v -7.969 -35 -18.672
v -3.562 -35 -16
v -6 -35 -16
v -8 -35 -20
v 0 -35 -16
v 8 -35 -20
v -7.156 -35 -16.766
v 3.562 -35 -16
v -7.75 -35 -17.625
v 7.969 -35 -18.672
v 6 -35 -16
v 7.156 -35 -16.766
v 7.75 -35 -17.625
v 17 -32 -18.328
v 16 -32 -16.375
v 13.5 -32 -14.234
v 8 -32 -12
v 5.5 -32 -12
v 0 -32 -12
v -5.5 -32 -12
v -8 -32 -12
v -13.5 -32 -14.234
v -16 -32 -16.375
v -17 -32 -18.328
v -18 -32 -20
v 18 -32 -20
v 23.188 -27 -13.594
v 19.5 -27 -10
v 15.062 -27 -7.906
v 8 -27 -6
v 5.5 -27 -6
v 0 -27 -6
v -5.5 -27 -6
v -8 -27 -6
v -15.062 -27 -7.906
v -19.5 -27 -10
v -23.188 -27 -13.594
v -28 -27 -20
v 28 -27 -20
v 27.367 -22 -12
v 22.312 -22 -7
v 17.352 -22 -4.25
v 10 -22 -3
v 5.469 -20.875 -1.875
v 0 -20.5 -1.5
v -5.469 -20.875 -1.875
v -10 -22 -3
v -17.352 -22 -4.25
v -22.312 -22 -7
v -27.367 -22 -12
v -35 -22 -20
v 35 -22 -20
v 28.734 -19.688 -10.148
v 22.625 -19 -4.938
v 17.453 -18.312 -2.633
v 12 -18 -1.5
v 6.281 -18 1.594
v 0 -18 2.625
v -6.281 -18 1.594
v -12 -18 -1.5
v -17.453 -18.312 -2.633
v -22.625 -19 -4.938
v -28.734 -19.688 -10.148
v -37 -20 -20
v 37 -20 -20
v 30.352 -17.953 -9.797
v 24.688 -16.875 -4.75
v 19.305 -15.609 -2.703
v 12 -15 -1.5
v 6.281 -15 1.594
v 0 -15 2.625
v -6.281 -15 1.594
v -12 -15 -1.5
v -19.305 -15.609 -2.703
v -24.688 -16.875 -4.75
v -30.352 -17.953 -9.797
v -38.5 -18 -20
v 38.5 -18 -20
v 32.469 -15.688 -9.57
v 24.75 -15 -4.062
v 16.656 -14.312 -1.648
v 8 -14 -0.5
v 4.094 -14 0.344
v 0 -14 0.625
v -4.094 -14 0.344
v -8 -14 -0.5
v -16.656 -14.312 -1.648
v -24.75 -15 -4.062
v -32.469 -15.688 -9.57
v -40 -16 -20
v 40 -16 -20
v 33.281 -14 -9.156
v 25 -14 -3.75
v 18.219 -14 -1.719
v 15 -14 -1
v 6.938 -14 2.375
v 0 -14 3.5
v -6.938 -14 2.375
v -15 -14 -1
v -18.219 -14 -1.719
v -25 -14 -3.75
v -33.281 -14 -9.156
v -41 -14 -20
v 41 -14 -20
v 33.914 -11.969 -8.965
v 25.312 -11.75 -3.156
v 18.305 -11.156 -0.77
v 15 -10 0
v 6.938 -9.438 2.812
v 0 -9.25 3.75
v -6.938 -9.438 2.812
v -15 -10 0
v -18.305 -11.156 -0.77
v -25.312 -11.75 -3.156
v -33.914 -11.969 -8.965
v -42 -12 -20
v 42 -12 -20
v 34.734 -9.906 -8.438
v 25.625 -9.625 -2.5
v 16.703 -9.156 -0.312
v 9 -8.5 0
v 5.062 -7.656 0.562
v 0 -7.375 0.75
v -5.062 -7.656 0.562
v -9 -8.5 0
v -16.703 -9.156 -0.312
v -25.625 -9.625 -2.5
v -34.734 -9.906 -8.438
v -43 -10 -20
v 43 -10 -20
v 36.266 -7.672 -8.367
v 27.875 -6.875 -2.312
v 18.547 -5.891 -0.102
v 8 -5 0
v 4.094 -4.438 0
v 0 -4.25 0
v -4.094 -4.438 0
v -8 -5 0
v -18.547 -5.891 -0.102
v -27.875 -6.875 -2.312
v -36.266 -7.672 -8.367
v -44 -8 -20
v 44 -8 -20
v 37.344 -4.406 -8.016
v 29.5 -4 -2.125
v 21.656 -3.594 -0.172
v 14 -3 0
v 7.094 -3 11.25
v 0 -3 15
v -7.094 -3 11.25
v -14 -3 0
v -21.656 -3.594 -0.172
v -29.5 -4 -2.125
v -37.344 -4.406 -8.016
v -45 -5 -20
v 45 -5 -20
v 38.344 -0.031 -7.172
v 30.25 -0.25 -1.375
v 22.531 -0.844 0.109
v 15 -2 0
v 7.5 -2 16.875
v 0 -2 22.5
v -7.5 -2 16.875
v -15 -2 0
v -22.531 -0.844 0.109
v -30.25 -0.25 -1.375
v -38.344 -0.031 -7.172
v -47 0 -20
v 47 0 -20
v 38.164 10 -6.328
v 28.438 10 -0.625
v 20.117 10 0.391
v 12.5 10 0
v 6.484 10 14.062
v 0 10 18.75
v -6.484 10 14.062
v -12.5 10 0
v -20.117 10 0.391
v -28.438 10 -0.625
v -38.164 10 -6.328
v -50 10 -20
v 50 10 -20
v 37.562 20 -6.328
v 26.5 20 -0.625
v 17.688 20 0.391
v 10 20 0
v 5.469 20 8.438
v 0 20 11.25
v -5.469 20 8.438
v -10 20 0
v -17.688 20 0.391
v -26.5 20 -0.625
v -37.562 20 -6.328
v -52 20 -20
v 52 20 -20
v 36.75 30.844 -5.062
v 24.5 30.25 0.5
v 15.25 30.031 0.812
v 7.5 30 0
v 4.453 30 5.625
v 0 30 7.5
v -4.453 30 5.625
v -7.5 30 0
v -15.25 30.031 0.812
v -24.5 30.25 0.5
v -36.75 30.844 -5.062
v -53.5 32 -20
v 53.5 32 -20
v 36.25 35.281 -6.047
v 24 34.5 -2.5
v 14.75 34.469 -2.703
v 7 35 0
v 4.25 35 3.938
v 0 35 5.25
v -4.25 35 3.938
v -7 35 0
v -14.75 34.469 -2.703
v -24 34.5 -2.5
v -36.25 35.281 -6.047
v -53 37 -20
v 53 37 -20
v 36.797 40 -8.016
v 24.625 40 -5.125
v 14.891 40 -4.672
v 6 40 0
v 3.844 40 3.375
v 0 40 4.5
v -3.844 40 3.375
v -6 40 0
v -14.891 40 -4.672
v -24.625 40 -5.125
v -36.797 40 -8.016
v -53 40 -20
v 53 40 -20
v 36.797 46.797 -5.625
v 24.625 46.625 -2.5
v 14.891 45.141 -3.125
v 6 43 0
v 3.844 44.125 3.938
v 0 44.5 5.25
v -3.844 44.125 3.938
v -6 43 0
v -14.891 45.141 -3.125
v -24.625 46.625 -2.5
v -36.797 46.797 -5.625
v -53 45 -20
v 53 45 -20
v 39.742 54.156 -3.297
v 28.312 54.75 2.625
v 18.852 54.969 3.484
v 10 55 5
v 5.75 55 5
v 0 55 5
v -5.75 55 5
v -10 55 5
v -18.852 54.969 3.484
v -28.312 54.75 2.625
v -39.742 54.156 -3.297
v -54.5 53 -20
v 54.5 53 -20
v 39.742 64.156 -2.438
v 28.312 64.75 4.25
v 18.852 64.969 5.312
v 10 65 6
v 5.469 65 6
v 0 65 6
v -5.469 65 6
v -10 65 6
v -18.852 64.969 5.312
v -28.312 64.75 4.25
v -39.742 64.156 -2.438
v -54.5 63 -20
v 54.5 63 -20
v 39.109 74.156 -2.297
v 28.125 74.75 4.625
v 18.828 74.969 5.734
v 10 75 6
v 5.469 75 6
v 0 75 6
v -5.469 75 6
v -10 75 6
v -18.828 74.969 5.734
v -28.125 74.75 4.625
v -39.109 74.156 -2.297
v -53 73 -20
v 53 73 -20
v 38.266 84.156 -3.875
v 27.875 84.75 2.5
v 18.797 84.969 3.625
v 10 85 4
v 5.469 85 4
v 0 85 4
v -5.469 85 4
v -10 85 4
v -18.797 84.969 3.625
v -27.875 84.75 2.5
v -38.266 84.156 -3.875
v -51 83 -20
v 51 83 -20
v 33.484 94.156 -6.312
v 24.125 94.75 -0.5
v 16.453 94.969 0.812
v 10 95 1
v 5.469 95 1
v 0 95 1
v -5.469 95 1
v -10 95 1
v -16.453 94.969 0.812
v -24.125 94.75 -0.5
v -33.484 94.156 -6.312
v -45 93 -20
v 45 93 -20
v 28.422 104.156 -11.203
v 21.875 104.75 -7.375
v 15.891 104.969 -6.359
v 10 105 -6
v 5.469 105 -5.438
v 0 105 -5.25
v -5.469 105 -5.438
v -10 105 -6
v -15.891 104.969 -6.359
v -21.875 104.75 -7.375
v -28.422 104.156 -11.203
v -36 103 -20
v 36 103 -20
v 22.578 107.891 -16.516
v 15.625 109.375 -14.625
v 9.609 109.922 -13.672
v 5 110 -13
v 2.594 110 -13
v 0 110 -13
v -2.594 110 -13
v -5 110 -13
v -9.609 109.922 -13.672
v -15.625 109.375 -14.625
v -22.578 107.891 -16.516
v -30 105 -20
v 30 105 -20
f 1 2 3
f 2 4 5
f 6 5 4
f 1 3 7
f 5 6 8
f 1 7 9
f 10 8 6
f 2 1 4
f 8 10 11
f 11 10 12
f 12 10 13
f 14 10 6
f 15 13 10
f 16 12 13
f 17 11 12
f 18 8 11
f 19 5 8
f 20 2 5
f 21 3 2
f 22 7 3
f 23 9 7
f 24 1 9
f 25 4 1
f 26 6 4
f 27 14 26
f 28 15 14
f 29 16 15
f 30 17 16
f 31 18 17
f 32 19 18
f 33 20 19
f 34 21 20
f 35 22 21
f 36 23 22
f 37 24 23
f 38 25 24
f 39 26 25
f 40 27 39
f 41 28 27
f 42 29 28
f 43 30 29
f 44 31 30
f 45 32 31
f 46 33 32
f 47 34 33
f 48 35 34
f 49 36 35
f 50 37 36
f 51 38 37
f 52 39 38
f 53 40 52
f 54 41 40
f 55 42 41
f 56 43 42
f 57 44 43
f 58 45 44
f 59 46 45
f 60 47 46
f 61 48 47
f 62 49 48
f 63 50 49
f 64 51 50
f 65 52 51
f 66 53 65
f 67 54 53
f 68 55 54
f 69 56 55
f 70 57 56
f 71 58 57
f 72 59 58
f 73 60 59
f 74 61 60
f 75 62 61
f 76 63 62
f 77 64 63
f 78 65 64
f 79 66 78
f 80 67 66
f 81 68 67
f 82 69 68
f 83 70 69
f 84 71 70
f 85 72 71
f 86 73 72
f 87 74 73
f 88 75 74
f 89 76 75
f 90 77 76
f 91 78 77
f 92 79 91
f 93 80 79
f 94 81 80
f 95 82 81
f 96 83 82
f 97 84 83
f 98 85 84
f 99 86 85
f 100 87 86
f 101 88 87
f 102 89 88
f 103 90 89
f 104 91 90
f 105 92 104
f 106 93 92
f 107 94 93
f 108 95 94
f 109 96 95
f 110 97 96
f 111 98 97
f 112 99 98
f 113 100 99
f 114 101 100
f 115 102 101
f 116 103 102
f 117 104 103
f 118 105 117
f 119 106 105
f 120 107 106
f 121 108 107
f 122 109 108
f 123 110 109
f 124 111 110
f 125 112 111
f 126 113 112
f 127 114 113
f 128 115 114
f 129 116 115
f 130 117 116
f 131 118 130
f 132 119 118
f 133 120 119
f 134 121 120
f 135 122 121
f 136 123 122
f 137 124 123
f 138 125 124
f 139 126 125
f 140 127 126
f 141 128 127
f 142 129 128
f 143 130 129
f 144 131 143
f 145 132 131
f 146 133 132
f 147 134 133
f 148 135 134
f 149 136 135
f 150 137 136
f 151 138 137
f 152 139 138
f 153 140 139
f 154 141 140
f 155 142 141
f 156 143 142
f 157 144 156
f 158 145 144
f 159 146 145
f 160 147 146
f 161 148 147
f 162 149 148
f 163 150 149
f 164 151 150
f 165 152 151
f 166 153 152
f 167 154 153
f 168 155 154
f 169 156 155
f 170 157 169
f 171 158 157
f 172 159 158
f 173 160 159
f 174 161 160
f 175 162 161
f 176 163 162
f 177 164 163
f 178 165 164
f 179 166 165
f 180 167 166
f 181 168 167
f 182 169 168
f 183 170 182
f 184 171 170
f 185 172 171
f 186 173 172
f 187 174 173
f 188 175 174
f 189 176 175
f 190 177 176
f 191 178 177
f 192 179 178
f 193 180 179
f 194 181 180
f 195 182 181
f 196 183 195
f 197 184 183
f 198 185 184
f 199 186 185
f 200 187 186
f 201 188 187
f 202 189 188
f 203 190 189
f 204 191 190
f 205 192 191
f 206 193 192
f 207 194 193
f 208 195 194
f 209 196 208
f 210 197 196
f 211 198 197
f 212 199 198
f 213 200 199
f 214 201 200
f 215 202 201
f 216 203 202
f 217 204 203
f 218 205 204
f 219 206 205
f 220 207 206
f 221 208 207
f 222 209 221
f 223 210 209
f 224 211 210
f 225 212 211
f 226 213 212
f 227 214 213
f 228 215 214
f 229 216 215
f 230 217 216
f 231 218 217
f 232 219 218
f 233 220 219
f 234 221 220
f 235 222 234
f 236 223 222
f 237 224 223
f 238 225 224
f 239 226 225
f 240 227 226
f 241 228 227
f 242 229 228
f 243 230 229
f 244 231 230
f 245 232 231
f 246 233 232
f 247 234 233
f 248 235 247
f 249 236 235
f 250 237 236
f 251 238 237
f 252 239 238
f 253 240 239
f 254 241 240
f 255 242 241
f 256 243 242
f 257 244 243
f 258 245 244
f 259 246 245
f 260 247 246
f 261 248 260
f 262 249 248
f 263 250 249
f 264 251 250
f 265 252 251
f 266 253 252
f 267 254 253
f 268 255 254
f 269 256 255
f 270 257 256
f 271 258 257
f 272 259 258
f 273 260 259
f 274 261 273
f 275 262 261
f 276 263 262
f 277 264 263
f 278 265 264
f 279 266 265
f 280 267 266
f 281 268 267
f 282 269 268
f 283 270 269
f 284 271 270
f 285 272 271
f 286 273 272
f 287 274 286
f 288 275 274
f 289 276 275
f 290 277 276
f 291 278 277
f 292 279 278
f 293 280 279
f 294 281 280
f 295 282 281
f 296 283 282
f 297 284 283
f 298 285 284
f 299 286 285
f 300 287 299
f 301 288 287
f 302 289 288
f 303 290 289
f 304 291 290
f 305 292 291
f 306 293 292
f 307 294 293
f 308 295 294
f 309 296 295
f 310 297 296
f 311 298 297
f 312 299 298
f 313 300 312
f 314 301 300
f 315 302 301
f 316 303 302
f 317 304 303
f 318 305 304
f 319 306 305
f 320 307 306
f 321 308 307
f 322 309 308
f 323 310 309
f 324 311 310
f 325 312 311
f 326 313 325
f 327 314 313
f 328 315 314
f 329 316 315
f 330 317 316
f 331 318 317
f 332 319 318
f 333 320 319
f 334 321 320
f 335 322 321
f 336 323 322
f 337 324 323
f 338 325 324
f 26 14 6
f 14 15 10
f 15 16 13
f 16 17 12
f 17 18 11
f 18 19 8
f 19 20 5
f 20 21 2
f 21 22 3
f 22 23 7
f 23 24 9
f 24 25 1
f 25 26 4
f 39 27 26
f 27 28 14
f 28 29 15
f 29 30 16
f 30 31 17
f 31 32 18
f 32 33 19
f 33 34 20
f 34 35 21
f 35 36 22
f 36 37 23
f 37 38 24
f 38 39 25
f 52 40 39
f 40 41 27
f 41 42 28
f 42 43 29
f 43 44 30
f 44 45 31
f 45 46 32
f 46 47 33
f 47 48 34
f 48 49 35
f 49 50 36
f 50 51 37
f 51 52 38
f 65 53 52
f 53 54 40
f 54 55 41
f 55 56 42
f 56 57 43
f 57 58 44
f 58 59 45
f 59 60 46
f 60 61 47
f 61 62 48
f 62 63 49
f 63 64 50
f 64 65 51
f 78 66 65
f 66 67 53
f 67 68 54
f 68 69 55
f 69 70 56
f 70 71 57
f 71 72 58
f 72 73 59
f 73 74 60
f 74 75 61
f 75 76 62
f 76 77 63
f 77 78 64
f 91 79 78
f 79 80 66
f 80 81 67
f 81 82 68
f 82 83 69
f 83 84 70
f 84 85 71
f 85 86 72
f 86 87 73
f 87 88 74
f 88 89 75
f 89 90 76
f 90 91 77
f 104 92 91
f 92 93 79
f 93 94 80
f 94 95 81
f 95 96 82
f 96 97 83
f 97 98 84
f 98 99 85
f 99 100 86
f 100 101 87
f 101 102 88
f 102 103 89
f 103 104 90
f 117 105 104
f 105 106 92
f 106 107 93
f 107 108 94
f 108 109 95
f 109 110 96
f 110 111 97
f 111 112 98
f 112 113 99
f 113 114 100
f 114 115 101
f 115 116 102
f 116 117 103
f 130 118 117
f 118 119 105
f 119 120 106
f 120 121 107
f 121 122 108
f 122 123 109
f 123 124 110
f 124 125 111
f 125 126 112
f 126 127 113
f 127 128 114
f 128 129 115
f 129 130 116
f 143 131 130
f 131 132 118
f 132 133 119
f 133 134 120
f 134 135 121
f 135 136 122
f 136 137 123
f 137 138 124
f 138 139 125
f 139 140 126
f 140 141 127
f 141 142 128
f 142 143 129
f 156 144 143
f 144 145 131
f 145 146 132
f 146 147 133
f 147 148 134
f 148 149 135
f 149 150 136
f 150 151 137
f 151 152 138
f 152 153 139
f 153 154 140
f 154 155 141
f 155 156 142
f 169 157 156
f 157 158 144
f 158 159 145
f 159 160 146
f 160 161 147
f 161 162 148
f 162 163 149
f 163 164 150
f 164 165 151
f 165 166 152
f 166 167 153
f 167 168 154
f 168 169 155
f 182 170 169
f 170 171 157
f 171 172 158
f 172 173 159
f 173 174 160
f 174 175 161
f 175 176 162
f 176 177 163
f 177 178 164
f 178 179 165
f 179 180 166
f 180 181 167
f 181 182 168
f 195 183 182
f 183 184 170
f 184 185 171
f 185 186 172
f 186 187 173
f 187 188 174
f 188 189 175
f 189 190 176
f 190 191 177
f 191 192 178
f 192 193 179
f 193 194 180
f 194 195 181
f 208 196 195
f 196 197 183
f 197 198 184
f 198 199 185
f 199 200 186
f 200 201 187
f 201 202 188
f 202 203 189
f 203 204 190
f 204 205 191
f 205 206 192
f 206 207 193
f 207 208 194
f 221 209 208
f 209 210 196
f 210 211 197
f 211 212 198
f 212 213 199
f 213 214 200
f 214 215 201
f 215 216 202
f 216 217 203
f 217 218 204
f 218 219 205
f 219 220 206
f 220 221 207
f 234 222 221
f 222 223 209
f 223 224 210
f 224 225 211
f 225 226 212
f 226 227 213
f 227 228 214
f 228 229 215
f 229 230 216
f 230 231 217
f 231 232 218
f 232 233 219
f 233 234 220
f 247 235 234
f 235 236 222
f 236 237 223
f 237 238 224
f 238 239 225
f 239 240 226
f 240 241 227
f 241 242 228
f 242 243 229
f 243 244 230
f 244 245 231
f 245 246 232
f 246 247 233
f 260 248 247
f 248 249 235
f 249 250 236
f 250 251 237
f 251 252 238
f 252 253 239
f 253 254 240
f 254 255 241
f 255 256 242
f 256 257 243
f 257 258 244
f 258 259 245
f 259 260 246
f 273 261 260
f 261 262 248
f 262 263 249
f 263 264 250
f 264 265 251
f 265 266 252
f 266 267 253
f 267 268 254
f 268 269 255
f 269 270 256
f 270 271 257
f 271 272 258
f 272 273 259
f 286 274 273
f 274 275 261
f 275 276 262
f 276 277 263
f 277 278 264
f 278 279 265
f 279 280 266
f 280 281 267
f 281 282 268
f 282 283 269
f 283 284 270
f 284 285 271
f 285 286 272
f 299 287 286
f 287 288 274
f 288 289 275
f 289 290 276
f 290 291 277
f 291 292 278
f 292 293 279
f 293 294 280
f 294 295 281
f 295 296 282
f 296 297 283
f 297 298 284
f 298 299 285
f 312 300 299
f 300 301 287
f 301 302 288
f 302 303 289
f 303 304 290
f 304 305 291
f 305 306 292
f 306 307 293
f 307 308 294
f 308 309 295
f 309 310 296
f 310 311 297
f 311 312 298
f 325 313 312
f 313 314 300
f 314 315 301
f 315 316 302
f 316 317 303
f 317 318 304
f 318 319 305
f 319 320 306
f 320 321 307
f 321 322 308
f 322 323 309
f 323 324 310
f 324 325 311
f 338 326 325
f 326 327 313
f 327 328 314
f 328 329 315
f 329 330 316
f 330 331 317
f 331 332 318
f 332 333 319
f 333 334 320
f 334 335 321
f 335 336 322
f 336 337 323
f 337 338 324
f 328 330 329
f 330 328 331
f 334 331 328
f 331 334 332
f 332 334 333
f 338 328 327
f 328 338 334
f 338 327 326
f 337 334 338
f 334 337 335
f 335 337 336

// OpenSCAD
model = "SOLID"; // [SOLID, SOLID_CROSS, MASK, MESH]
// Bigger is better
resolution = 0.25;
thickness = 3;

// Commonly-used private APIs

function __to2d(p) = [p[0], p[1]];
function __to3d(p) = [p[0], p[1], 0];

function __reverse(vt) = 
    let(leng = len(vt))
    [
        for(i = [0:leng - 1])
            vt[leng - 1 - i]
    ];
    
function __frags(radius) = $fn > 0 ? 
            ($fn >= 3 ? $fn : 3) : 
            max(min(360 / $fa, radius * 6.28318 / $fs), 5);
            
function __nearest_multiple_of_4(n) =
    let(
        remain = n % 4
    )
    (remain / 4) > 0.5 ? n - remain + 4 : n - remain;


/**
* bezier_curve.scad
*
* Given a set of control points, the bezier_curve function returns points of the Bézier path. 
* Combined with the polyline, polyline3d or hull_polyline3d module defined in my lib-openscad, 
* you can create a Bézier curve.
* 
* @copyright Justin Lin, 2017
* @license https://opensource.org/licenses/lgpl-3.0.html
*
* @see https://openhome.cc/eGossip/OpenSCAD/lib-bezier_curve.html
*
**/ 

function _combi(n, k) =
    let(  
        bi_coef = [      
               [1],     // n = 0: for padding
              [1,1],    // n = 1: for Linear curves, how about drawing a line directly?
             [1,2,1],   // n = 2: for Quadratic curves
            [1,3,3,1]   // n = 3: for Cubic Bézier curves
        ]  
    )
    n < len(bi_coef) ? bi_coef[n][k] : (
        k == 0 ? 1 : (_combi(n, k - 1) * (n - k + 1) / k)
    );
        
function bezier_curve_coordinate(t, pn, n, i = 0) = 
    i == n + 1 ? 0 : 
        (_combi(n, i) * pn[i] * pow(1 - t, n - i) * pow(t, i) + 
            bezier_curve_coordinate(t, pn, n, i + 1));
        
function _bezier_curve_point(t, points) = 
    let(n = len(points) - 1) 
    [
        bezier_curve_coordinate(
            t, 
            [for(p = points) p[0]], 
            n
        ),
        bezier_curve_coordinate(
            t,  
            [for(p = points) p[1]], 
            n
        ),
        bezier_curve_coordinate(
            t, 
            [for(p = points) p[2]], 
            n
        )
    ];

function bezier_curve(t_step, points) = 
    let(
        pts = concat([
            for(t = [0: t_step: 1]) 
                _bezier_curve_point(t, points)
        ], [_bezier_curve_point(1, points)])
    ) 
    len(points[0]) == 3 ? pts : [for(pt = pts) __to2d(pt)];

/**
* rotate_p.scad
*
* Rotates a point 'a' degrees around an arbitrary axis. 
* The rotation is applied in the following order: x, y, z. 
* 
* @copyright Justin Lin, 2017
* @license https://opensource.org/licenses/lgpl-3.0.html
*
* @see https://openhome.cc/eGossip/OpenSCAD/lib-rotate_p.html
*
**/ 

function _rotx(pt, a) = 
    let(cosa = cos(a), sina = sin(a))
    [
        pt[0], 
        pt[1] * cosa - pt[2] * sina,
        pt[1] * sina + pt[2] * cosa
    ];

function _roty(pt, a) = 
    let(cosa = cos(a), sina = sin(a))
    [
        pt[0] * cosa + pt[2] * sina, 
        pt[1],
        -pt[0] * sina + pt[2] * cosa, 
    ];

function _rotz(pt, a) = 
    let(cosa = cos(a), sina = sin(a))
    [
        pt[0] * cosa - pt[1] * sina,
        pt[0] * sina + pt[1] * cosa,
        pt[2]
    ];

function _rotate_p_3d(point, a) =
    _rotz(_roty(_rotx(point, a[0]), a[1]), a[2]);

function to_avect(a) =
     len(a) == 3 ? a : (
         len(a) == 2 ? [a[0], a[1], 0] : (
             len(a) == 1 ? [a[0], 0, 0] : [0, 0, a]
         ) 
     );

function rotate_p(point, a) =
    let(angle = to_avect(a))
    len(point) == 3 ? 
        _rotate_p_3d(point, angle) :
        __to2d(
            _rotate_p_3d(__to3d(point), angle)
        );
    
/**
* polysections.scad
*
* Crosscutting a tube-like shape at different points gets several cross-sections.
* This module can operate reversely. It uses cross-sections to construct a tube-like shape.
* 
* @copyright Justin Lin, 2017
* @license https://opensource.org/licenses/lgpl-3.0.html
*
* @see https://openhome.cc/eGossip/OpenSCAD/lib-polysections.html
*
**/

module polysections(sections, triangles = "SOLID") {

    function side_indexes(sects, begin_idx = 0) = 
        let(       
            leng_sects = len(sects),
            leng_pts_sect = len(sects[0])
        ) 
        concat(
            [
                for(j = [begin_idx:leng_pts_sect:begin_idx + (leng_sects - 2) * leng_pts_sect])
                    for(i = [0:leng_pts_sect - 1]) 
                        [
                            j + i, 
                            j + (i + 1) % leng_pts_sect, 
                            j + (i + 1) % leng_pts_sect + leng_pts_sect
                        ]
            ],
            [
                for(j = [begin_idx:leng_pts_sect:begin_idx + (leng_sects - 2) * leng_pts_sect])
                    for(i = [0:leng_pts_sect - 1]) 
                        [
                            j + i, 
                            j + (i + 1) % leng_pts_sect + leng_pts_sect , 
                            j + i + leng_pts_sect
                        ]
            ]      
        );

    function search_at(f_sect, p, leng_pts_sect, i = 0) =
        i < leng_pts_sect ?
            (p == f_sect[i] ? i : search_at(f_sect, p, leng_pts_sect, i + 1)) : -1;
    
    function the_same_after_twisting(f_sect, l_sect, leng_pts_sect) =
        let(
            found_at_i = search_at(f_sect, l_sect[0], leng_pts_sect)
        )
        found_at_i <= 0 ? false : 
            l_sect == concat(
                [for(i = [found_at_i:leng_pts_sect-1]) f_sect[i]],
                [for(i = [0:found_at_i - 1]) f_sect[i]]
            );        

    module solid_sections(sects) {
        
        leng_sects = len(sects);
        leng_pts_sect = len(sects[0]);
        first_sect = sects[0];
        last_sect = sects[leng_sects - 1];
   
        v_pts = [
            for(sect = sects) 
                for(pt = sect) 
                    pt
        ];

        function begin_end_the_same() =
            first_sect == last_sect || 
            the_same_after_twisting(first_sect, last_sect, leng_pts_sect);

        if(begin_end_the_same()) {
            polyhedron(
                v_pts, 
                side_indexes(sects)
            ); 
        } else {
            first_idxes = [for(i = [0:leng_pts_sect - 1]) leng_pts_sect - 1 - i];  
            last_idxes = [
                for(i = [0:leng_pts_sect - 1]) 
                    i + leng_pts_sect * (leng_sects - 1)
            ];       

            polyhedron(
                v_pts, 
                concat([first_idxes], side_indexes(sects), [last_idxes])
            );    
        }
    }

    module hollow_sections(sects) {
        leng_sects = len(sects);
        leng_sect = len(sects[0]);
        half_leng_sect = leng_sect / 2;
        half_leng_v_pts = leng_sects * half_leng_sect;

        function strip_sects(begin_idx, end_idx) = 
            [
                for(i = [0:leng_sects - 1]) 
                    [
                        for(j = [begin_idx:end_idx])
                            sects[i][j]
                    ]
            ]; 

        function first_idxes() = 
            [
                for(i =  [0:half_leng_sect - 1]) 
                    [
                       i,
                       i + half_leng_v_pts,
                       (i + 1) % half_leng_sect + half_leng_v_pts, 
                       (i + 1) % half_leng_sect
                    ] 
            ];

        function last_idxes(begin_idx) = 
            [
                for(i =  [0:half_leng_sect - 1]) 
                    [
                       begin_idx + i,
                       begin_idx + (i + 1) % half_leng_sect,
                       begin_idx + (i + 1) % half_leng_sect + half_leng_v_pts,
                       begin_idx + i + half_leng_v_pts
                    ]     
            ];            

        outer_sects = strip_sects(0, half_leng_sect - 1);
        inner_sects = strip_sects(half_leng_sect, leng_sect - 1);

        function to_v_pts(sects) = 
             [
                for(sect = sects) 
                    for(pt = sect) 
                        pt
             ];

        outer_v_pts =  to_v_pts(outer_sects);
        inner_v_pts = to_v_pts(inner_sects);

        outer_idxes = side_indexes(outer_sects);
        inner_idxes = [ 
            for(idxes = side_indexes(inner_sects, half_leng_v_pts))
                __reverse(idxes)
        ];

        first_outer_sect = outer_sects[0];
        last_outer_sect = outer_sects[leng_sects - 1];
        first_inner_sect = inner_sects[0];
        last_inner_sect = inner_sects[leng_sects - 1];
        
        leng_pts_sect = len(first_outer_sect);

        function begin_end_the_same() = 
           (first_outer_sect == last_outer_sect && first_inner_sect == last_inner_sect) ||
           (
               the_same_after_twisting(first_outer_sect, last_outer_sect, leng_pts_sect) && 
               the_same_after_twisting(first_inner_sect, last_inner_sect, leng_pts_sect)
           ); 

        if(begin_end_the_same()) {
            polyhedron(
                concat(outer_v_pts, inner_v_pts),
                concat(outer_idxes, inner_idxes)
            );             
        } else {
            first_idxes = first_idxes();
            last_idxes = last_idxes(half_leng_v_pts - half_leng_sect);
            
            polyhedron(
                concat(outer_v_pts, inner_v_pts),
                concat(first_idxes, outer_idxes, inner_idxes, last_idxes)
            ); 
        }
    }
    
    module triangles_defined_sections() {
        module tri_sections(tri1, tri2) {
            polyhedron(
                points = concat(tri1, tri2),
                faces = [
                    [0, 1, 2], 
                    [3, 5, 4], 
                    [0, 4, 1], [1, 5, 2], [2, 3, 0], 
                    [0, 3, 4], [1, 4, 5], [2, 5, 3]
                ]
            );  
        }

        module two_sections(section1, section2) {
            for(idx = triangles) {
                // hull is for preventing from WARNING: Object may not be a valid 2-manifold
                hull() tri_sections(
                    [
                        section1[idx[0]], 
                        section1[idx[1]], 
                        section1[idx[2]]
                    ], 
                    [
                        section2[idx[0]], 
                        section2[idx[1]], 
                        section2[idx[2]]
                    ]
                );
            }
        }
        
        for(i = [0:len(sections) - 2]) {
             two_sections(
                 sections[i], 
                 sections[i + 1]
             );
        }
    }
    
    if(triangles == "SOLID") {
        solid_sections(sections);
    } else if(triangles == "HOLLOW") {
        hollow_sections(sections);
    }
    else {
        triangles_defined_sections();
    }
}

/**
* line3d.scad
*
* Creates a 3D line from two points. 
* 
* @copyright Justin Lin, 2017
* @license https://opensource.org/licenses/lgpl-3.0.html
*
* @see https://openhome.cc/eGossip/OpenSCAD/lib-line3d.html
*
**/


module line3d(p1, p2, thickness, p1Style = "CAP_CIRCLE", p2Style = "CAP_CIRCLE") {
    r = thickness / 2;

    frags = __nearest_multiple_of_4(__frags(r));
    half_fa = 180 / frags;
    
    dx = p2[0] - p1[0];
    dy = p2[1] - p1[1];
    dz = p2[2] - p1[2];
    
    
    length = sqrt(pow(dx, 2) + pow(dy, 2) + pow(dz, 2));

    ay = 90 - atan2(dz, sqrt(pow(dx, 2) + pow(dy, 2)));
    az = atan2(dy, dx);

    module cap_butt() {
        translate(p1) 
            rotate([0, ay, az]) 
                linear_extrude(length) 
                    circle(r, $fn = frags);
    }
                
    module capCircle(p) {
        w = r / 1.414;
        translate(p) 
            rotate([0, ay, az]) 
                translate([0, 0, -w]) 
                    linear_extrude(w * 2) 
                        circle(r, $fn = frags);       
    }

    module capSphere(p) {
        translate(p) 
            rotate([0, ay, az]) 
                sphere(r / cos(half_fa), $fn = frags);          
    }
    
    module cap(p, style) {
        if(style == "CAP_CIRCLE") {
            capCircle(p);     
        } else if(style == "CAP_SPHERE") { 
            capSphere(p);  
        }       
    }
    
    cap_butt();
    cap(p1, p1Style);
    cap(p2, p2Style);
}

/**
* polyline3d.scad
*
* Creates a 3D polyline from a list of `[x, y, z]` coordinates. 
* It depends on the line3d module so you have to include line3d.scad.
* 
* @copyright Justin Lin, 2017
* @license https://opensource.org/licenses/lgpl-3.0.html
*
* @see https://openhome.cc/eGossip/OpenSCAD/lib-polyline3d.html
*
**/

module polyline3d(points, thickness, startingStyle = "CAP_CIRCLE", endingStyle = "CAP_CIRCLE") {
    leng_pts = len(points);
    
    module line_segment(index) {
        styles = index == 1 ? [startingStyle, "CAP_BUTT"] : (
            index == leng_pts - 1 ? ["CAP_SPHERE", endingStyle] : [
                "CAP_SPHERE", "CAP_BUTT"
            ]
        );
        
        line3d(points[index - 1], points[index], thickness, 
               p1Style = styles[0], p2Style = styles[1]);
    }

    module polyline3d_inner(index) {
        if(index < leng_pts) {
            line_segment(index);
            polyline3d_inner(index + 1);
        }
    }

    polyline3d_inner(1);
}

/**
* function_grapher.scad
*
* 
* Given a set of points `[x, y, f(x, y)]` where `f(x, y)` is a 
* mathematics function, the `function_grapher` module can 
* create the graph of `f(x, y)`.
* It depends on the line3d and polyline3d modules so you have 
* to include "line3d.scad" and "polyline3d.scad".
* 
* @copyright Justin Lin, 2017
* @license https://opensource.org/licenses/lgpl-3.0.html
*
* @see https://openhome.cc/eGossip/OpenSCAD/lib-function_grapher.html
*
**/ 

module function_grapher(points, thickness, style = "FACES", slicing = "SLASH") {

    rows = len(points);
    columns = len(points[0]);

    // Increasing $fn will be slow when you use "LINES" or "HULL_FACES".
    
    module faces() {
        function xy_to_index(x, y, columns) = y * columns + x; 

        top_pts = [
                for(row_pts = points)
                    for(pt = row_pts)
                        pt
        ];
            
        base_pts = [
            for(pt = top_pts)
                [pt[0], pt[1], pt[2] - thickness]
        ];
        
        leng_pts = len(top_pts);
                
        top_tri_faces1 = slicing == "SLASH" ? [
            for(yi = [0:rows - 2]) 
                for(xi = [0:columns - 2])
                    [
                        xy_to_index(xi, yi, columns),
                        xy_to_index(xi + 1, yi + 1, columns),
                        xy_to_index(xi + 1, yi, columns)
                    ]    
        ] : [
            for(yi = [0:rows - 2]) 
                for(xi = [0:columns - 2])
                    [
                        xy_to_index(xi, yi, columns),
                        xy_to_index(xi, yi + 1, columns),
                        xy_to_index(xi + 1, yi, columns)
                    ]    
        ];

        top_tri_faces2 = slicing == "SLASH" ? [
            for(yi = [0:rows - 2]) 
                for(xi = [0:columns - 2])
                    [
                        xy_to_index(xi, yi, columns),
                        xy_to_index(xi, yi + 1, columns),
                        xy_to_index(xi + 1, yi + 1, columns)
                    ]    
        ] : [
            for(yi = [0:rows - 2]) 
                for(xi = [0:columns - 2])
                    [
                        xy_to_index(xi, yi + 1, columns),
                        xy_to_index(xi + 1, yi + 1, columns),
                        xy_to_index(xi + 1, yi, columns)
                    ]    
        ];        

        base_tri_faces1 = [
            for(face = top_tri_faces1)
                __reverse(face) + [leng_pts, leng_pts, leng_pts]
        ];

        base_tri_faces2 = [
            for(face = top_tri_faces2)
                __reverse(face) + [leng_pts, leng_pts, leng_pts]
        ];
        
        side_faces1 = [
            for(xi = [0:columns - 2])
                let(
                    idx1 = xy_to_index(xi, 0, columns),
                    idx2 = xy_to_index(xi + 1, 0, columns)
                )
                [
                    idx1,
                    idx2,
                    idx2 + leng_pts,
                    idx1 + leng_pts
                ]
        ];

        side_faces2 = [
            for(yi = [0:rows - 2])
                let(
                    xi = columns - 1,
                    idx1 = xy_to_index(xi, yi, columns),
                    idx2 = xy_to_index(xi, yi + 1, columns)
                )
                [
                    idx1,
                    idx2,
                    idx2 + leng_pts,
                    idx1 + leng_pts
                ]
        ];                  
      
        side_faces3 = [
            for(xi = [0:columns - 2])
                let(
                    yi = rows - 1,
                    idx1 = xy_to_index(xi, yi, columns), 
                    idx2 = xy_to_index(xi + 1, yi, columns)
                )
                [
                    idx2,
                    idx1,
                    idx1 + leng_pts,
                    idx2 + leng_pts
                ]
        ];
        
        side_faces4 = [
            for(yi = [0:rows - 2])
                let(
                    idx1 = xy_to_index(0, yi, columns),
                    idx2 = xy_to_index(0, yi + 1, columns)
                )
                [
                    idx2,
                    idx1,
                    idx1 + leng_pts,
                    idx2 + leng_pts
                ]
        ];                  
        
        polyhedron(
            points = concat(top_pts, base_pts), 
            faces = concat(
                top_tri_faces1, top_tri_faces2,
                base_tri_faces1, base_tri_faces2, 
                side_faces1, 
                side_faces2, 
                side_faces3, 
                side_faces4
            )
        );    
    }

    module tri_to_lines(tri1, tri2) {
       polyline3d(concat(tri1, [tri1[0]]), thickness);
       polyline3d(concat(tri2, [tri2[0]]), thickness);
    }
    
    module hull_pts(tri) {
       half_thickness = thickness / 2;
       hull() {
           translate(tri[0]) sphere(half_thickness);
           translate(tri[1]) sphere(half_thickness);
           translate(tri[2]) sphere(half_thickness);
       }    
    }
    
    module tri_to_hull_faces(tri1, tri2) {
       hull_pts(tri1);
       hull_pts(tri2);
    }    

    module tri_to_graph(tri1, tri2) {
        if(style == "LINES") {
            tri_to_lines(tri1, tri2);
        } else {  // Warning: May be very slow!!
            tri_to_hull_faces(tri1, tri2);
        }
    }
    
    
    

    
    if(style == "FACES") {
        faces();
    } else {
        for(yi = [0:rows - 2]) {
            for(xi = [0:columns - 2]) {
                if(slicing == "SLASH") {
                    tri_to_graph([
                        points[yi][xi], 
                        points[yi][xi + 1], 
                        points[yi + 1][xi + 1]
                    ], [
                        points[yi][xi], 
                        points[yi + 1][xi + 1], 
                        points[yi + 1][xi]
                    ]);
                } else {                
                    tri_to_graph([
                        points[yi][xi], 
                        points[yi][xi + 1], 
                        points[yi + 1][xi]
                    ], [
                        points[yi + 1][xi], 
                        points[yi][xi + 1], 
                        points[yi + 1][xi + 1]
                    ]);                    
                }        
            }
        }
    }
}

/**
* shape_ellipse.scad
*
* Returns shape points of an ellipse.
* They can be used with xxx_extrude modules of dotSCAD.
* The shape points can be also used with the built-in polygon module. 
* 
* @copyright Justin Lin, 2017
* @license https://opensource.org/licenses/lgpl-3.0.html
*
* @see https://openhome.cc/eGossip/OpenSCAD/lib-shape_ellipse.html
*
**/

function shape_ellipse(axes) =
    let(
        frags = __frags(axes[0]),
        step_a = 360 / frags,
        shape_pts = [
            for(a = [0:step_a:360 - step_a]) 
                [axes[0] * cos(a), axes[1] * sin(a)]
        ]
    ) shape_pts;



function face_section(ctrl_points) = 
    let(
        middle = [
            [-ctrl_points[1][0], ctrl_points[1][1], ctrl_points[1][2]],
            [-ctrl_points[0][0], ctrl_points[0][1], ctrl_points[0][2]],
            ctrl_points[0],
            ctrl_points[1]
        ],
        right = [
            ctrl_points[1],
            ctrl_points[2],
            ctrl_points[3],
            ctrl_points[4]
        ],
        left = [
            for(i = [0:3]) 
                [
                    -right[3 - i][0],
                    right[3 - i][1],
                    right[3 - i][2]
                ]
        ]
    ) __reverse(
        concat(
            bezier_curve(resolution, left), 
            bezier_curve(resolution, middle), 
            bezier_curve(resolution, right)
        )
    );

//

sections = [
    // chin
    face_section([
        [4, -35, -16],
        [6, -35, -16],
        [8, -35, -17],
        [8, -35, -18],
        [8, -35, -20]
    ]),
    
    face_section([
        [8, -32, -12],
        [8, -32, -12],
        [18, -32, -15],
        [16, -32, -18],
        [18, -32, -20]
    ]),
    
    face_section([
        [8, -27, -6],
        [8, -27, -6],
        [20, -27, -9],
        [20, -27, -9],
        [28, -27, -20]
    ]),
    
    // mouth
    face_section([
        [5, -20, -1],
        [10, -22, -3],
        [22.5, -22, -4],
        [22, -22, -7],
        [35, -22, -20]
    ]),
   
    face_section([
        [5, -18, 4],
        [12, -18, -1.5],
        [20, -18, -3],
        [24, -20, -3],
        [37, -20, -20]
    ]),    
    
    face_section([
        [5, -15, 4],
        [12, -15, -1.5],
        [24, -15, -3.5],
        [25, -19, -2],
        [38.5, -18, -20]
    ]),
    
    face_section([
        [3, -14, 1],
        [8, -14, -0.5],
        [20, -14, -2],
        [30, -16, -2],
        [40, -16, -20]
    ]),

    face_section([
        [3, -14, 5],
        [15, -14, -1],
        [16, -14, -2],
        [32, -14, -1],
        [41, -14, -20]
    ]),

    face_section([
        [3, -9, 5],
        [15, -10, 0],
        [16, -12, -0.75],
        [32.5, -12, -1],
        [42, -12, -20]
    ]),
   
    face_section([
        [5, -7, 1],
        [9, -8.5, 0],
        [18, -9.5, 0],
        [33, -10, 0],
        [43, -10, -20]
    ]),   
   
    face_section([
        [3, -4, 0],
        [8, -5, 0],
        [23, -6, 0.5],
        [34, -8, 0],
        [44, -8, -20]
    ]),
    
    face_section([
        [5, -3, 20],
        [14, -3, 0],
        [24, -4, 0],
        [35, -4, 1],
        [45, -5, -20]
    ]),
    // x-axis
    face_section([
        [5, -2, 30],
        [15, -2, 0],
        [25, 0, 0],
        [35, 0, 3],
        [47, 0, -20]    
    ]),

    face_section([
        [5, 10, 25],
        [12.5, 10, 0],
        [22.5, 10, 0],
        [32.5, 10, 5],
        [50, 10, -20]  
    ]),

    face_section([
        [5, 20, 15],
        [10, 20, 0],
        [20, 20, 0],
        [30, 20, 5],
        [52, 20, -20]
    ]),

    face_section([
        [5, 30, 10],
        [7.5, 30, 0],
        [17.5, 30, 0],
        [27.5, 30, 8],
        [53.5, 32, -20]
    ]),
    // eyes
    face_section([
        [5, 35, 7],
        [7, 35, 0],
        [17, 34, -8.5],
        [27, 34, 8.5],
        [53, 37, -20]
    ]),

    face_section([
        [5, 40, 6],
        [6, 40, 0],
        [18, 40, -12],
        [28, 40, 5],
        [53, 40, -20]
    ]),

    face_section([
        [5, 45, 7],
        [6, 43, 0],
        [18, 46, -10],
        [28, 49, 10],
        [53, 45, -20]
    ]),
    // forehead
    face_section([
        [6, 55, 5],
        [10, 55, 5],
        [22, 55, 0],
        [32, 55, 12],
        [54.5, 53, -20]
    ]),


    face_section([
        [5, 65, 6],
        [10, 65, 6],
        [22, 65, 3],
        [32, 65, 13],
        [54.5, 63, -20]
    ]),
    
    face_section([
        [5, 75, 6],
        [10, 75, 6],
        [22, 75, 4],
        [32, 75, 13],
        [53, 73, -20]
    ]),
    
    face_section([
        [5, 85, 4],
        [10, 85, 4],
        [22, 85, 2],
        [32, 85, 10],
        [51, 83, -20]
    ]),
    
    face_section([
        [5, 95, 1],
        [10, 95, 1],
        [18, 95, 0],
        [28, 95, 5],
        [45, 93, -20]
    ]),
    
    face_section([
        [5, 105, -5],
        [10, 105, -6],
        [18, 105, -7],
        [25, 105, -4],
        [36, 103, -20]
    ]),
    
    face_section([
        [2, 110, -13],
        [5, 110, -13],
        [10, 110, -14],
        [20, 110, -14],
        [30, 105, -20]
    ])           
];

if(model == "SOLID" || model == "SOLID_CROSS") {
    polysections(sections);
    if(model == "SOLID_CROSS") {
        for(section = sections) {
            polyline3d(section, thickness);
        }    
    }
} else if(model == "MASK") {
    difference() {
        function_grapher(
            sections, 
            thickness, 
            style = "HULL_FACES", 
            $fn = 4
        );

        translate([27, 42, 0]) 
            linear_extrude(100, center = true) 
                polygon(shape_ellipse([14, 5], $fn = 8));
                
        translate([-27, 42, 0]) 
            linear_extrude(100, center = true) 
                polygon(shape_ellipse([14, 5], $fn = 8));            
    }     
} else if(model == "MESH") {
    function_grapher(
        sections, 
        thickness, 
        style = "LINES", 
        $fn = 4
    );
}
